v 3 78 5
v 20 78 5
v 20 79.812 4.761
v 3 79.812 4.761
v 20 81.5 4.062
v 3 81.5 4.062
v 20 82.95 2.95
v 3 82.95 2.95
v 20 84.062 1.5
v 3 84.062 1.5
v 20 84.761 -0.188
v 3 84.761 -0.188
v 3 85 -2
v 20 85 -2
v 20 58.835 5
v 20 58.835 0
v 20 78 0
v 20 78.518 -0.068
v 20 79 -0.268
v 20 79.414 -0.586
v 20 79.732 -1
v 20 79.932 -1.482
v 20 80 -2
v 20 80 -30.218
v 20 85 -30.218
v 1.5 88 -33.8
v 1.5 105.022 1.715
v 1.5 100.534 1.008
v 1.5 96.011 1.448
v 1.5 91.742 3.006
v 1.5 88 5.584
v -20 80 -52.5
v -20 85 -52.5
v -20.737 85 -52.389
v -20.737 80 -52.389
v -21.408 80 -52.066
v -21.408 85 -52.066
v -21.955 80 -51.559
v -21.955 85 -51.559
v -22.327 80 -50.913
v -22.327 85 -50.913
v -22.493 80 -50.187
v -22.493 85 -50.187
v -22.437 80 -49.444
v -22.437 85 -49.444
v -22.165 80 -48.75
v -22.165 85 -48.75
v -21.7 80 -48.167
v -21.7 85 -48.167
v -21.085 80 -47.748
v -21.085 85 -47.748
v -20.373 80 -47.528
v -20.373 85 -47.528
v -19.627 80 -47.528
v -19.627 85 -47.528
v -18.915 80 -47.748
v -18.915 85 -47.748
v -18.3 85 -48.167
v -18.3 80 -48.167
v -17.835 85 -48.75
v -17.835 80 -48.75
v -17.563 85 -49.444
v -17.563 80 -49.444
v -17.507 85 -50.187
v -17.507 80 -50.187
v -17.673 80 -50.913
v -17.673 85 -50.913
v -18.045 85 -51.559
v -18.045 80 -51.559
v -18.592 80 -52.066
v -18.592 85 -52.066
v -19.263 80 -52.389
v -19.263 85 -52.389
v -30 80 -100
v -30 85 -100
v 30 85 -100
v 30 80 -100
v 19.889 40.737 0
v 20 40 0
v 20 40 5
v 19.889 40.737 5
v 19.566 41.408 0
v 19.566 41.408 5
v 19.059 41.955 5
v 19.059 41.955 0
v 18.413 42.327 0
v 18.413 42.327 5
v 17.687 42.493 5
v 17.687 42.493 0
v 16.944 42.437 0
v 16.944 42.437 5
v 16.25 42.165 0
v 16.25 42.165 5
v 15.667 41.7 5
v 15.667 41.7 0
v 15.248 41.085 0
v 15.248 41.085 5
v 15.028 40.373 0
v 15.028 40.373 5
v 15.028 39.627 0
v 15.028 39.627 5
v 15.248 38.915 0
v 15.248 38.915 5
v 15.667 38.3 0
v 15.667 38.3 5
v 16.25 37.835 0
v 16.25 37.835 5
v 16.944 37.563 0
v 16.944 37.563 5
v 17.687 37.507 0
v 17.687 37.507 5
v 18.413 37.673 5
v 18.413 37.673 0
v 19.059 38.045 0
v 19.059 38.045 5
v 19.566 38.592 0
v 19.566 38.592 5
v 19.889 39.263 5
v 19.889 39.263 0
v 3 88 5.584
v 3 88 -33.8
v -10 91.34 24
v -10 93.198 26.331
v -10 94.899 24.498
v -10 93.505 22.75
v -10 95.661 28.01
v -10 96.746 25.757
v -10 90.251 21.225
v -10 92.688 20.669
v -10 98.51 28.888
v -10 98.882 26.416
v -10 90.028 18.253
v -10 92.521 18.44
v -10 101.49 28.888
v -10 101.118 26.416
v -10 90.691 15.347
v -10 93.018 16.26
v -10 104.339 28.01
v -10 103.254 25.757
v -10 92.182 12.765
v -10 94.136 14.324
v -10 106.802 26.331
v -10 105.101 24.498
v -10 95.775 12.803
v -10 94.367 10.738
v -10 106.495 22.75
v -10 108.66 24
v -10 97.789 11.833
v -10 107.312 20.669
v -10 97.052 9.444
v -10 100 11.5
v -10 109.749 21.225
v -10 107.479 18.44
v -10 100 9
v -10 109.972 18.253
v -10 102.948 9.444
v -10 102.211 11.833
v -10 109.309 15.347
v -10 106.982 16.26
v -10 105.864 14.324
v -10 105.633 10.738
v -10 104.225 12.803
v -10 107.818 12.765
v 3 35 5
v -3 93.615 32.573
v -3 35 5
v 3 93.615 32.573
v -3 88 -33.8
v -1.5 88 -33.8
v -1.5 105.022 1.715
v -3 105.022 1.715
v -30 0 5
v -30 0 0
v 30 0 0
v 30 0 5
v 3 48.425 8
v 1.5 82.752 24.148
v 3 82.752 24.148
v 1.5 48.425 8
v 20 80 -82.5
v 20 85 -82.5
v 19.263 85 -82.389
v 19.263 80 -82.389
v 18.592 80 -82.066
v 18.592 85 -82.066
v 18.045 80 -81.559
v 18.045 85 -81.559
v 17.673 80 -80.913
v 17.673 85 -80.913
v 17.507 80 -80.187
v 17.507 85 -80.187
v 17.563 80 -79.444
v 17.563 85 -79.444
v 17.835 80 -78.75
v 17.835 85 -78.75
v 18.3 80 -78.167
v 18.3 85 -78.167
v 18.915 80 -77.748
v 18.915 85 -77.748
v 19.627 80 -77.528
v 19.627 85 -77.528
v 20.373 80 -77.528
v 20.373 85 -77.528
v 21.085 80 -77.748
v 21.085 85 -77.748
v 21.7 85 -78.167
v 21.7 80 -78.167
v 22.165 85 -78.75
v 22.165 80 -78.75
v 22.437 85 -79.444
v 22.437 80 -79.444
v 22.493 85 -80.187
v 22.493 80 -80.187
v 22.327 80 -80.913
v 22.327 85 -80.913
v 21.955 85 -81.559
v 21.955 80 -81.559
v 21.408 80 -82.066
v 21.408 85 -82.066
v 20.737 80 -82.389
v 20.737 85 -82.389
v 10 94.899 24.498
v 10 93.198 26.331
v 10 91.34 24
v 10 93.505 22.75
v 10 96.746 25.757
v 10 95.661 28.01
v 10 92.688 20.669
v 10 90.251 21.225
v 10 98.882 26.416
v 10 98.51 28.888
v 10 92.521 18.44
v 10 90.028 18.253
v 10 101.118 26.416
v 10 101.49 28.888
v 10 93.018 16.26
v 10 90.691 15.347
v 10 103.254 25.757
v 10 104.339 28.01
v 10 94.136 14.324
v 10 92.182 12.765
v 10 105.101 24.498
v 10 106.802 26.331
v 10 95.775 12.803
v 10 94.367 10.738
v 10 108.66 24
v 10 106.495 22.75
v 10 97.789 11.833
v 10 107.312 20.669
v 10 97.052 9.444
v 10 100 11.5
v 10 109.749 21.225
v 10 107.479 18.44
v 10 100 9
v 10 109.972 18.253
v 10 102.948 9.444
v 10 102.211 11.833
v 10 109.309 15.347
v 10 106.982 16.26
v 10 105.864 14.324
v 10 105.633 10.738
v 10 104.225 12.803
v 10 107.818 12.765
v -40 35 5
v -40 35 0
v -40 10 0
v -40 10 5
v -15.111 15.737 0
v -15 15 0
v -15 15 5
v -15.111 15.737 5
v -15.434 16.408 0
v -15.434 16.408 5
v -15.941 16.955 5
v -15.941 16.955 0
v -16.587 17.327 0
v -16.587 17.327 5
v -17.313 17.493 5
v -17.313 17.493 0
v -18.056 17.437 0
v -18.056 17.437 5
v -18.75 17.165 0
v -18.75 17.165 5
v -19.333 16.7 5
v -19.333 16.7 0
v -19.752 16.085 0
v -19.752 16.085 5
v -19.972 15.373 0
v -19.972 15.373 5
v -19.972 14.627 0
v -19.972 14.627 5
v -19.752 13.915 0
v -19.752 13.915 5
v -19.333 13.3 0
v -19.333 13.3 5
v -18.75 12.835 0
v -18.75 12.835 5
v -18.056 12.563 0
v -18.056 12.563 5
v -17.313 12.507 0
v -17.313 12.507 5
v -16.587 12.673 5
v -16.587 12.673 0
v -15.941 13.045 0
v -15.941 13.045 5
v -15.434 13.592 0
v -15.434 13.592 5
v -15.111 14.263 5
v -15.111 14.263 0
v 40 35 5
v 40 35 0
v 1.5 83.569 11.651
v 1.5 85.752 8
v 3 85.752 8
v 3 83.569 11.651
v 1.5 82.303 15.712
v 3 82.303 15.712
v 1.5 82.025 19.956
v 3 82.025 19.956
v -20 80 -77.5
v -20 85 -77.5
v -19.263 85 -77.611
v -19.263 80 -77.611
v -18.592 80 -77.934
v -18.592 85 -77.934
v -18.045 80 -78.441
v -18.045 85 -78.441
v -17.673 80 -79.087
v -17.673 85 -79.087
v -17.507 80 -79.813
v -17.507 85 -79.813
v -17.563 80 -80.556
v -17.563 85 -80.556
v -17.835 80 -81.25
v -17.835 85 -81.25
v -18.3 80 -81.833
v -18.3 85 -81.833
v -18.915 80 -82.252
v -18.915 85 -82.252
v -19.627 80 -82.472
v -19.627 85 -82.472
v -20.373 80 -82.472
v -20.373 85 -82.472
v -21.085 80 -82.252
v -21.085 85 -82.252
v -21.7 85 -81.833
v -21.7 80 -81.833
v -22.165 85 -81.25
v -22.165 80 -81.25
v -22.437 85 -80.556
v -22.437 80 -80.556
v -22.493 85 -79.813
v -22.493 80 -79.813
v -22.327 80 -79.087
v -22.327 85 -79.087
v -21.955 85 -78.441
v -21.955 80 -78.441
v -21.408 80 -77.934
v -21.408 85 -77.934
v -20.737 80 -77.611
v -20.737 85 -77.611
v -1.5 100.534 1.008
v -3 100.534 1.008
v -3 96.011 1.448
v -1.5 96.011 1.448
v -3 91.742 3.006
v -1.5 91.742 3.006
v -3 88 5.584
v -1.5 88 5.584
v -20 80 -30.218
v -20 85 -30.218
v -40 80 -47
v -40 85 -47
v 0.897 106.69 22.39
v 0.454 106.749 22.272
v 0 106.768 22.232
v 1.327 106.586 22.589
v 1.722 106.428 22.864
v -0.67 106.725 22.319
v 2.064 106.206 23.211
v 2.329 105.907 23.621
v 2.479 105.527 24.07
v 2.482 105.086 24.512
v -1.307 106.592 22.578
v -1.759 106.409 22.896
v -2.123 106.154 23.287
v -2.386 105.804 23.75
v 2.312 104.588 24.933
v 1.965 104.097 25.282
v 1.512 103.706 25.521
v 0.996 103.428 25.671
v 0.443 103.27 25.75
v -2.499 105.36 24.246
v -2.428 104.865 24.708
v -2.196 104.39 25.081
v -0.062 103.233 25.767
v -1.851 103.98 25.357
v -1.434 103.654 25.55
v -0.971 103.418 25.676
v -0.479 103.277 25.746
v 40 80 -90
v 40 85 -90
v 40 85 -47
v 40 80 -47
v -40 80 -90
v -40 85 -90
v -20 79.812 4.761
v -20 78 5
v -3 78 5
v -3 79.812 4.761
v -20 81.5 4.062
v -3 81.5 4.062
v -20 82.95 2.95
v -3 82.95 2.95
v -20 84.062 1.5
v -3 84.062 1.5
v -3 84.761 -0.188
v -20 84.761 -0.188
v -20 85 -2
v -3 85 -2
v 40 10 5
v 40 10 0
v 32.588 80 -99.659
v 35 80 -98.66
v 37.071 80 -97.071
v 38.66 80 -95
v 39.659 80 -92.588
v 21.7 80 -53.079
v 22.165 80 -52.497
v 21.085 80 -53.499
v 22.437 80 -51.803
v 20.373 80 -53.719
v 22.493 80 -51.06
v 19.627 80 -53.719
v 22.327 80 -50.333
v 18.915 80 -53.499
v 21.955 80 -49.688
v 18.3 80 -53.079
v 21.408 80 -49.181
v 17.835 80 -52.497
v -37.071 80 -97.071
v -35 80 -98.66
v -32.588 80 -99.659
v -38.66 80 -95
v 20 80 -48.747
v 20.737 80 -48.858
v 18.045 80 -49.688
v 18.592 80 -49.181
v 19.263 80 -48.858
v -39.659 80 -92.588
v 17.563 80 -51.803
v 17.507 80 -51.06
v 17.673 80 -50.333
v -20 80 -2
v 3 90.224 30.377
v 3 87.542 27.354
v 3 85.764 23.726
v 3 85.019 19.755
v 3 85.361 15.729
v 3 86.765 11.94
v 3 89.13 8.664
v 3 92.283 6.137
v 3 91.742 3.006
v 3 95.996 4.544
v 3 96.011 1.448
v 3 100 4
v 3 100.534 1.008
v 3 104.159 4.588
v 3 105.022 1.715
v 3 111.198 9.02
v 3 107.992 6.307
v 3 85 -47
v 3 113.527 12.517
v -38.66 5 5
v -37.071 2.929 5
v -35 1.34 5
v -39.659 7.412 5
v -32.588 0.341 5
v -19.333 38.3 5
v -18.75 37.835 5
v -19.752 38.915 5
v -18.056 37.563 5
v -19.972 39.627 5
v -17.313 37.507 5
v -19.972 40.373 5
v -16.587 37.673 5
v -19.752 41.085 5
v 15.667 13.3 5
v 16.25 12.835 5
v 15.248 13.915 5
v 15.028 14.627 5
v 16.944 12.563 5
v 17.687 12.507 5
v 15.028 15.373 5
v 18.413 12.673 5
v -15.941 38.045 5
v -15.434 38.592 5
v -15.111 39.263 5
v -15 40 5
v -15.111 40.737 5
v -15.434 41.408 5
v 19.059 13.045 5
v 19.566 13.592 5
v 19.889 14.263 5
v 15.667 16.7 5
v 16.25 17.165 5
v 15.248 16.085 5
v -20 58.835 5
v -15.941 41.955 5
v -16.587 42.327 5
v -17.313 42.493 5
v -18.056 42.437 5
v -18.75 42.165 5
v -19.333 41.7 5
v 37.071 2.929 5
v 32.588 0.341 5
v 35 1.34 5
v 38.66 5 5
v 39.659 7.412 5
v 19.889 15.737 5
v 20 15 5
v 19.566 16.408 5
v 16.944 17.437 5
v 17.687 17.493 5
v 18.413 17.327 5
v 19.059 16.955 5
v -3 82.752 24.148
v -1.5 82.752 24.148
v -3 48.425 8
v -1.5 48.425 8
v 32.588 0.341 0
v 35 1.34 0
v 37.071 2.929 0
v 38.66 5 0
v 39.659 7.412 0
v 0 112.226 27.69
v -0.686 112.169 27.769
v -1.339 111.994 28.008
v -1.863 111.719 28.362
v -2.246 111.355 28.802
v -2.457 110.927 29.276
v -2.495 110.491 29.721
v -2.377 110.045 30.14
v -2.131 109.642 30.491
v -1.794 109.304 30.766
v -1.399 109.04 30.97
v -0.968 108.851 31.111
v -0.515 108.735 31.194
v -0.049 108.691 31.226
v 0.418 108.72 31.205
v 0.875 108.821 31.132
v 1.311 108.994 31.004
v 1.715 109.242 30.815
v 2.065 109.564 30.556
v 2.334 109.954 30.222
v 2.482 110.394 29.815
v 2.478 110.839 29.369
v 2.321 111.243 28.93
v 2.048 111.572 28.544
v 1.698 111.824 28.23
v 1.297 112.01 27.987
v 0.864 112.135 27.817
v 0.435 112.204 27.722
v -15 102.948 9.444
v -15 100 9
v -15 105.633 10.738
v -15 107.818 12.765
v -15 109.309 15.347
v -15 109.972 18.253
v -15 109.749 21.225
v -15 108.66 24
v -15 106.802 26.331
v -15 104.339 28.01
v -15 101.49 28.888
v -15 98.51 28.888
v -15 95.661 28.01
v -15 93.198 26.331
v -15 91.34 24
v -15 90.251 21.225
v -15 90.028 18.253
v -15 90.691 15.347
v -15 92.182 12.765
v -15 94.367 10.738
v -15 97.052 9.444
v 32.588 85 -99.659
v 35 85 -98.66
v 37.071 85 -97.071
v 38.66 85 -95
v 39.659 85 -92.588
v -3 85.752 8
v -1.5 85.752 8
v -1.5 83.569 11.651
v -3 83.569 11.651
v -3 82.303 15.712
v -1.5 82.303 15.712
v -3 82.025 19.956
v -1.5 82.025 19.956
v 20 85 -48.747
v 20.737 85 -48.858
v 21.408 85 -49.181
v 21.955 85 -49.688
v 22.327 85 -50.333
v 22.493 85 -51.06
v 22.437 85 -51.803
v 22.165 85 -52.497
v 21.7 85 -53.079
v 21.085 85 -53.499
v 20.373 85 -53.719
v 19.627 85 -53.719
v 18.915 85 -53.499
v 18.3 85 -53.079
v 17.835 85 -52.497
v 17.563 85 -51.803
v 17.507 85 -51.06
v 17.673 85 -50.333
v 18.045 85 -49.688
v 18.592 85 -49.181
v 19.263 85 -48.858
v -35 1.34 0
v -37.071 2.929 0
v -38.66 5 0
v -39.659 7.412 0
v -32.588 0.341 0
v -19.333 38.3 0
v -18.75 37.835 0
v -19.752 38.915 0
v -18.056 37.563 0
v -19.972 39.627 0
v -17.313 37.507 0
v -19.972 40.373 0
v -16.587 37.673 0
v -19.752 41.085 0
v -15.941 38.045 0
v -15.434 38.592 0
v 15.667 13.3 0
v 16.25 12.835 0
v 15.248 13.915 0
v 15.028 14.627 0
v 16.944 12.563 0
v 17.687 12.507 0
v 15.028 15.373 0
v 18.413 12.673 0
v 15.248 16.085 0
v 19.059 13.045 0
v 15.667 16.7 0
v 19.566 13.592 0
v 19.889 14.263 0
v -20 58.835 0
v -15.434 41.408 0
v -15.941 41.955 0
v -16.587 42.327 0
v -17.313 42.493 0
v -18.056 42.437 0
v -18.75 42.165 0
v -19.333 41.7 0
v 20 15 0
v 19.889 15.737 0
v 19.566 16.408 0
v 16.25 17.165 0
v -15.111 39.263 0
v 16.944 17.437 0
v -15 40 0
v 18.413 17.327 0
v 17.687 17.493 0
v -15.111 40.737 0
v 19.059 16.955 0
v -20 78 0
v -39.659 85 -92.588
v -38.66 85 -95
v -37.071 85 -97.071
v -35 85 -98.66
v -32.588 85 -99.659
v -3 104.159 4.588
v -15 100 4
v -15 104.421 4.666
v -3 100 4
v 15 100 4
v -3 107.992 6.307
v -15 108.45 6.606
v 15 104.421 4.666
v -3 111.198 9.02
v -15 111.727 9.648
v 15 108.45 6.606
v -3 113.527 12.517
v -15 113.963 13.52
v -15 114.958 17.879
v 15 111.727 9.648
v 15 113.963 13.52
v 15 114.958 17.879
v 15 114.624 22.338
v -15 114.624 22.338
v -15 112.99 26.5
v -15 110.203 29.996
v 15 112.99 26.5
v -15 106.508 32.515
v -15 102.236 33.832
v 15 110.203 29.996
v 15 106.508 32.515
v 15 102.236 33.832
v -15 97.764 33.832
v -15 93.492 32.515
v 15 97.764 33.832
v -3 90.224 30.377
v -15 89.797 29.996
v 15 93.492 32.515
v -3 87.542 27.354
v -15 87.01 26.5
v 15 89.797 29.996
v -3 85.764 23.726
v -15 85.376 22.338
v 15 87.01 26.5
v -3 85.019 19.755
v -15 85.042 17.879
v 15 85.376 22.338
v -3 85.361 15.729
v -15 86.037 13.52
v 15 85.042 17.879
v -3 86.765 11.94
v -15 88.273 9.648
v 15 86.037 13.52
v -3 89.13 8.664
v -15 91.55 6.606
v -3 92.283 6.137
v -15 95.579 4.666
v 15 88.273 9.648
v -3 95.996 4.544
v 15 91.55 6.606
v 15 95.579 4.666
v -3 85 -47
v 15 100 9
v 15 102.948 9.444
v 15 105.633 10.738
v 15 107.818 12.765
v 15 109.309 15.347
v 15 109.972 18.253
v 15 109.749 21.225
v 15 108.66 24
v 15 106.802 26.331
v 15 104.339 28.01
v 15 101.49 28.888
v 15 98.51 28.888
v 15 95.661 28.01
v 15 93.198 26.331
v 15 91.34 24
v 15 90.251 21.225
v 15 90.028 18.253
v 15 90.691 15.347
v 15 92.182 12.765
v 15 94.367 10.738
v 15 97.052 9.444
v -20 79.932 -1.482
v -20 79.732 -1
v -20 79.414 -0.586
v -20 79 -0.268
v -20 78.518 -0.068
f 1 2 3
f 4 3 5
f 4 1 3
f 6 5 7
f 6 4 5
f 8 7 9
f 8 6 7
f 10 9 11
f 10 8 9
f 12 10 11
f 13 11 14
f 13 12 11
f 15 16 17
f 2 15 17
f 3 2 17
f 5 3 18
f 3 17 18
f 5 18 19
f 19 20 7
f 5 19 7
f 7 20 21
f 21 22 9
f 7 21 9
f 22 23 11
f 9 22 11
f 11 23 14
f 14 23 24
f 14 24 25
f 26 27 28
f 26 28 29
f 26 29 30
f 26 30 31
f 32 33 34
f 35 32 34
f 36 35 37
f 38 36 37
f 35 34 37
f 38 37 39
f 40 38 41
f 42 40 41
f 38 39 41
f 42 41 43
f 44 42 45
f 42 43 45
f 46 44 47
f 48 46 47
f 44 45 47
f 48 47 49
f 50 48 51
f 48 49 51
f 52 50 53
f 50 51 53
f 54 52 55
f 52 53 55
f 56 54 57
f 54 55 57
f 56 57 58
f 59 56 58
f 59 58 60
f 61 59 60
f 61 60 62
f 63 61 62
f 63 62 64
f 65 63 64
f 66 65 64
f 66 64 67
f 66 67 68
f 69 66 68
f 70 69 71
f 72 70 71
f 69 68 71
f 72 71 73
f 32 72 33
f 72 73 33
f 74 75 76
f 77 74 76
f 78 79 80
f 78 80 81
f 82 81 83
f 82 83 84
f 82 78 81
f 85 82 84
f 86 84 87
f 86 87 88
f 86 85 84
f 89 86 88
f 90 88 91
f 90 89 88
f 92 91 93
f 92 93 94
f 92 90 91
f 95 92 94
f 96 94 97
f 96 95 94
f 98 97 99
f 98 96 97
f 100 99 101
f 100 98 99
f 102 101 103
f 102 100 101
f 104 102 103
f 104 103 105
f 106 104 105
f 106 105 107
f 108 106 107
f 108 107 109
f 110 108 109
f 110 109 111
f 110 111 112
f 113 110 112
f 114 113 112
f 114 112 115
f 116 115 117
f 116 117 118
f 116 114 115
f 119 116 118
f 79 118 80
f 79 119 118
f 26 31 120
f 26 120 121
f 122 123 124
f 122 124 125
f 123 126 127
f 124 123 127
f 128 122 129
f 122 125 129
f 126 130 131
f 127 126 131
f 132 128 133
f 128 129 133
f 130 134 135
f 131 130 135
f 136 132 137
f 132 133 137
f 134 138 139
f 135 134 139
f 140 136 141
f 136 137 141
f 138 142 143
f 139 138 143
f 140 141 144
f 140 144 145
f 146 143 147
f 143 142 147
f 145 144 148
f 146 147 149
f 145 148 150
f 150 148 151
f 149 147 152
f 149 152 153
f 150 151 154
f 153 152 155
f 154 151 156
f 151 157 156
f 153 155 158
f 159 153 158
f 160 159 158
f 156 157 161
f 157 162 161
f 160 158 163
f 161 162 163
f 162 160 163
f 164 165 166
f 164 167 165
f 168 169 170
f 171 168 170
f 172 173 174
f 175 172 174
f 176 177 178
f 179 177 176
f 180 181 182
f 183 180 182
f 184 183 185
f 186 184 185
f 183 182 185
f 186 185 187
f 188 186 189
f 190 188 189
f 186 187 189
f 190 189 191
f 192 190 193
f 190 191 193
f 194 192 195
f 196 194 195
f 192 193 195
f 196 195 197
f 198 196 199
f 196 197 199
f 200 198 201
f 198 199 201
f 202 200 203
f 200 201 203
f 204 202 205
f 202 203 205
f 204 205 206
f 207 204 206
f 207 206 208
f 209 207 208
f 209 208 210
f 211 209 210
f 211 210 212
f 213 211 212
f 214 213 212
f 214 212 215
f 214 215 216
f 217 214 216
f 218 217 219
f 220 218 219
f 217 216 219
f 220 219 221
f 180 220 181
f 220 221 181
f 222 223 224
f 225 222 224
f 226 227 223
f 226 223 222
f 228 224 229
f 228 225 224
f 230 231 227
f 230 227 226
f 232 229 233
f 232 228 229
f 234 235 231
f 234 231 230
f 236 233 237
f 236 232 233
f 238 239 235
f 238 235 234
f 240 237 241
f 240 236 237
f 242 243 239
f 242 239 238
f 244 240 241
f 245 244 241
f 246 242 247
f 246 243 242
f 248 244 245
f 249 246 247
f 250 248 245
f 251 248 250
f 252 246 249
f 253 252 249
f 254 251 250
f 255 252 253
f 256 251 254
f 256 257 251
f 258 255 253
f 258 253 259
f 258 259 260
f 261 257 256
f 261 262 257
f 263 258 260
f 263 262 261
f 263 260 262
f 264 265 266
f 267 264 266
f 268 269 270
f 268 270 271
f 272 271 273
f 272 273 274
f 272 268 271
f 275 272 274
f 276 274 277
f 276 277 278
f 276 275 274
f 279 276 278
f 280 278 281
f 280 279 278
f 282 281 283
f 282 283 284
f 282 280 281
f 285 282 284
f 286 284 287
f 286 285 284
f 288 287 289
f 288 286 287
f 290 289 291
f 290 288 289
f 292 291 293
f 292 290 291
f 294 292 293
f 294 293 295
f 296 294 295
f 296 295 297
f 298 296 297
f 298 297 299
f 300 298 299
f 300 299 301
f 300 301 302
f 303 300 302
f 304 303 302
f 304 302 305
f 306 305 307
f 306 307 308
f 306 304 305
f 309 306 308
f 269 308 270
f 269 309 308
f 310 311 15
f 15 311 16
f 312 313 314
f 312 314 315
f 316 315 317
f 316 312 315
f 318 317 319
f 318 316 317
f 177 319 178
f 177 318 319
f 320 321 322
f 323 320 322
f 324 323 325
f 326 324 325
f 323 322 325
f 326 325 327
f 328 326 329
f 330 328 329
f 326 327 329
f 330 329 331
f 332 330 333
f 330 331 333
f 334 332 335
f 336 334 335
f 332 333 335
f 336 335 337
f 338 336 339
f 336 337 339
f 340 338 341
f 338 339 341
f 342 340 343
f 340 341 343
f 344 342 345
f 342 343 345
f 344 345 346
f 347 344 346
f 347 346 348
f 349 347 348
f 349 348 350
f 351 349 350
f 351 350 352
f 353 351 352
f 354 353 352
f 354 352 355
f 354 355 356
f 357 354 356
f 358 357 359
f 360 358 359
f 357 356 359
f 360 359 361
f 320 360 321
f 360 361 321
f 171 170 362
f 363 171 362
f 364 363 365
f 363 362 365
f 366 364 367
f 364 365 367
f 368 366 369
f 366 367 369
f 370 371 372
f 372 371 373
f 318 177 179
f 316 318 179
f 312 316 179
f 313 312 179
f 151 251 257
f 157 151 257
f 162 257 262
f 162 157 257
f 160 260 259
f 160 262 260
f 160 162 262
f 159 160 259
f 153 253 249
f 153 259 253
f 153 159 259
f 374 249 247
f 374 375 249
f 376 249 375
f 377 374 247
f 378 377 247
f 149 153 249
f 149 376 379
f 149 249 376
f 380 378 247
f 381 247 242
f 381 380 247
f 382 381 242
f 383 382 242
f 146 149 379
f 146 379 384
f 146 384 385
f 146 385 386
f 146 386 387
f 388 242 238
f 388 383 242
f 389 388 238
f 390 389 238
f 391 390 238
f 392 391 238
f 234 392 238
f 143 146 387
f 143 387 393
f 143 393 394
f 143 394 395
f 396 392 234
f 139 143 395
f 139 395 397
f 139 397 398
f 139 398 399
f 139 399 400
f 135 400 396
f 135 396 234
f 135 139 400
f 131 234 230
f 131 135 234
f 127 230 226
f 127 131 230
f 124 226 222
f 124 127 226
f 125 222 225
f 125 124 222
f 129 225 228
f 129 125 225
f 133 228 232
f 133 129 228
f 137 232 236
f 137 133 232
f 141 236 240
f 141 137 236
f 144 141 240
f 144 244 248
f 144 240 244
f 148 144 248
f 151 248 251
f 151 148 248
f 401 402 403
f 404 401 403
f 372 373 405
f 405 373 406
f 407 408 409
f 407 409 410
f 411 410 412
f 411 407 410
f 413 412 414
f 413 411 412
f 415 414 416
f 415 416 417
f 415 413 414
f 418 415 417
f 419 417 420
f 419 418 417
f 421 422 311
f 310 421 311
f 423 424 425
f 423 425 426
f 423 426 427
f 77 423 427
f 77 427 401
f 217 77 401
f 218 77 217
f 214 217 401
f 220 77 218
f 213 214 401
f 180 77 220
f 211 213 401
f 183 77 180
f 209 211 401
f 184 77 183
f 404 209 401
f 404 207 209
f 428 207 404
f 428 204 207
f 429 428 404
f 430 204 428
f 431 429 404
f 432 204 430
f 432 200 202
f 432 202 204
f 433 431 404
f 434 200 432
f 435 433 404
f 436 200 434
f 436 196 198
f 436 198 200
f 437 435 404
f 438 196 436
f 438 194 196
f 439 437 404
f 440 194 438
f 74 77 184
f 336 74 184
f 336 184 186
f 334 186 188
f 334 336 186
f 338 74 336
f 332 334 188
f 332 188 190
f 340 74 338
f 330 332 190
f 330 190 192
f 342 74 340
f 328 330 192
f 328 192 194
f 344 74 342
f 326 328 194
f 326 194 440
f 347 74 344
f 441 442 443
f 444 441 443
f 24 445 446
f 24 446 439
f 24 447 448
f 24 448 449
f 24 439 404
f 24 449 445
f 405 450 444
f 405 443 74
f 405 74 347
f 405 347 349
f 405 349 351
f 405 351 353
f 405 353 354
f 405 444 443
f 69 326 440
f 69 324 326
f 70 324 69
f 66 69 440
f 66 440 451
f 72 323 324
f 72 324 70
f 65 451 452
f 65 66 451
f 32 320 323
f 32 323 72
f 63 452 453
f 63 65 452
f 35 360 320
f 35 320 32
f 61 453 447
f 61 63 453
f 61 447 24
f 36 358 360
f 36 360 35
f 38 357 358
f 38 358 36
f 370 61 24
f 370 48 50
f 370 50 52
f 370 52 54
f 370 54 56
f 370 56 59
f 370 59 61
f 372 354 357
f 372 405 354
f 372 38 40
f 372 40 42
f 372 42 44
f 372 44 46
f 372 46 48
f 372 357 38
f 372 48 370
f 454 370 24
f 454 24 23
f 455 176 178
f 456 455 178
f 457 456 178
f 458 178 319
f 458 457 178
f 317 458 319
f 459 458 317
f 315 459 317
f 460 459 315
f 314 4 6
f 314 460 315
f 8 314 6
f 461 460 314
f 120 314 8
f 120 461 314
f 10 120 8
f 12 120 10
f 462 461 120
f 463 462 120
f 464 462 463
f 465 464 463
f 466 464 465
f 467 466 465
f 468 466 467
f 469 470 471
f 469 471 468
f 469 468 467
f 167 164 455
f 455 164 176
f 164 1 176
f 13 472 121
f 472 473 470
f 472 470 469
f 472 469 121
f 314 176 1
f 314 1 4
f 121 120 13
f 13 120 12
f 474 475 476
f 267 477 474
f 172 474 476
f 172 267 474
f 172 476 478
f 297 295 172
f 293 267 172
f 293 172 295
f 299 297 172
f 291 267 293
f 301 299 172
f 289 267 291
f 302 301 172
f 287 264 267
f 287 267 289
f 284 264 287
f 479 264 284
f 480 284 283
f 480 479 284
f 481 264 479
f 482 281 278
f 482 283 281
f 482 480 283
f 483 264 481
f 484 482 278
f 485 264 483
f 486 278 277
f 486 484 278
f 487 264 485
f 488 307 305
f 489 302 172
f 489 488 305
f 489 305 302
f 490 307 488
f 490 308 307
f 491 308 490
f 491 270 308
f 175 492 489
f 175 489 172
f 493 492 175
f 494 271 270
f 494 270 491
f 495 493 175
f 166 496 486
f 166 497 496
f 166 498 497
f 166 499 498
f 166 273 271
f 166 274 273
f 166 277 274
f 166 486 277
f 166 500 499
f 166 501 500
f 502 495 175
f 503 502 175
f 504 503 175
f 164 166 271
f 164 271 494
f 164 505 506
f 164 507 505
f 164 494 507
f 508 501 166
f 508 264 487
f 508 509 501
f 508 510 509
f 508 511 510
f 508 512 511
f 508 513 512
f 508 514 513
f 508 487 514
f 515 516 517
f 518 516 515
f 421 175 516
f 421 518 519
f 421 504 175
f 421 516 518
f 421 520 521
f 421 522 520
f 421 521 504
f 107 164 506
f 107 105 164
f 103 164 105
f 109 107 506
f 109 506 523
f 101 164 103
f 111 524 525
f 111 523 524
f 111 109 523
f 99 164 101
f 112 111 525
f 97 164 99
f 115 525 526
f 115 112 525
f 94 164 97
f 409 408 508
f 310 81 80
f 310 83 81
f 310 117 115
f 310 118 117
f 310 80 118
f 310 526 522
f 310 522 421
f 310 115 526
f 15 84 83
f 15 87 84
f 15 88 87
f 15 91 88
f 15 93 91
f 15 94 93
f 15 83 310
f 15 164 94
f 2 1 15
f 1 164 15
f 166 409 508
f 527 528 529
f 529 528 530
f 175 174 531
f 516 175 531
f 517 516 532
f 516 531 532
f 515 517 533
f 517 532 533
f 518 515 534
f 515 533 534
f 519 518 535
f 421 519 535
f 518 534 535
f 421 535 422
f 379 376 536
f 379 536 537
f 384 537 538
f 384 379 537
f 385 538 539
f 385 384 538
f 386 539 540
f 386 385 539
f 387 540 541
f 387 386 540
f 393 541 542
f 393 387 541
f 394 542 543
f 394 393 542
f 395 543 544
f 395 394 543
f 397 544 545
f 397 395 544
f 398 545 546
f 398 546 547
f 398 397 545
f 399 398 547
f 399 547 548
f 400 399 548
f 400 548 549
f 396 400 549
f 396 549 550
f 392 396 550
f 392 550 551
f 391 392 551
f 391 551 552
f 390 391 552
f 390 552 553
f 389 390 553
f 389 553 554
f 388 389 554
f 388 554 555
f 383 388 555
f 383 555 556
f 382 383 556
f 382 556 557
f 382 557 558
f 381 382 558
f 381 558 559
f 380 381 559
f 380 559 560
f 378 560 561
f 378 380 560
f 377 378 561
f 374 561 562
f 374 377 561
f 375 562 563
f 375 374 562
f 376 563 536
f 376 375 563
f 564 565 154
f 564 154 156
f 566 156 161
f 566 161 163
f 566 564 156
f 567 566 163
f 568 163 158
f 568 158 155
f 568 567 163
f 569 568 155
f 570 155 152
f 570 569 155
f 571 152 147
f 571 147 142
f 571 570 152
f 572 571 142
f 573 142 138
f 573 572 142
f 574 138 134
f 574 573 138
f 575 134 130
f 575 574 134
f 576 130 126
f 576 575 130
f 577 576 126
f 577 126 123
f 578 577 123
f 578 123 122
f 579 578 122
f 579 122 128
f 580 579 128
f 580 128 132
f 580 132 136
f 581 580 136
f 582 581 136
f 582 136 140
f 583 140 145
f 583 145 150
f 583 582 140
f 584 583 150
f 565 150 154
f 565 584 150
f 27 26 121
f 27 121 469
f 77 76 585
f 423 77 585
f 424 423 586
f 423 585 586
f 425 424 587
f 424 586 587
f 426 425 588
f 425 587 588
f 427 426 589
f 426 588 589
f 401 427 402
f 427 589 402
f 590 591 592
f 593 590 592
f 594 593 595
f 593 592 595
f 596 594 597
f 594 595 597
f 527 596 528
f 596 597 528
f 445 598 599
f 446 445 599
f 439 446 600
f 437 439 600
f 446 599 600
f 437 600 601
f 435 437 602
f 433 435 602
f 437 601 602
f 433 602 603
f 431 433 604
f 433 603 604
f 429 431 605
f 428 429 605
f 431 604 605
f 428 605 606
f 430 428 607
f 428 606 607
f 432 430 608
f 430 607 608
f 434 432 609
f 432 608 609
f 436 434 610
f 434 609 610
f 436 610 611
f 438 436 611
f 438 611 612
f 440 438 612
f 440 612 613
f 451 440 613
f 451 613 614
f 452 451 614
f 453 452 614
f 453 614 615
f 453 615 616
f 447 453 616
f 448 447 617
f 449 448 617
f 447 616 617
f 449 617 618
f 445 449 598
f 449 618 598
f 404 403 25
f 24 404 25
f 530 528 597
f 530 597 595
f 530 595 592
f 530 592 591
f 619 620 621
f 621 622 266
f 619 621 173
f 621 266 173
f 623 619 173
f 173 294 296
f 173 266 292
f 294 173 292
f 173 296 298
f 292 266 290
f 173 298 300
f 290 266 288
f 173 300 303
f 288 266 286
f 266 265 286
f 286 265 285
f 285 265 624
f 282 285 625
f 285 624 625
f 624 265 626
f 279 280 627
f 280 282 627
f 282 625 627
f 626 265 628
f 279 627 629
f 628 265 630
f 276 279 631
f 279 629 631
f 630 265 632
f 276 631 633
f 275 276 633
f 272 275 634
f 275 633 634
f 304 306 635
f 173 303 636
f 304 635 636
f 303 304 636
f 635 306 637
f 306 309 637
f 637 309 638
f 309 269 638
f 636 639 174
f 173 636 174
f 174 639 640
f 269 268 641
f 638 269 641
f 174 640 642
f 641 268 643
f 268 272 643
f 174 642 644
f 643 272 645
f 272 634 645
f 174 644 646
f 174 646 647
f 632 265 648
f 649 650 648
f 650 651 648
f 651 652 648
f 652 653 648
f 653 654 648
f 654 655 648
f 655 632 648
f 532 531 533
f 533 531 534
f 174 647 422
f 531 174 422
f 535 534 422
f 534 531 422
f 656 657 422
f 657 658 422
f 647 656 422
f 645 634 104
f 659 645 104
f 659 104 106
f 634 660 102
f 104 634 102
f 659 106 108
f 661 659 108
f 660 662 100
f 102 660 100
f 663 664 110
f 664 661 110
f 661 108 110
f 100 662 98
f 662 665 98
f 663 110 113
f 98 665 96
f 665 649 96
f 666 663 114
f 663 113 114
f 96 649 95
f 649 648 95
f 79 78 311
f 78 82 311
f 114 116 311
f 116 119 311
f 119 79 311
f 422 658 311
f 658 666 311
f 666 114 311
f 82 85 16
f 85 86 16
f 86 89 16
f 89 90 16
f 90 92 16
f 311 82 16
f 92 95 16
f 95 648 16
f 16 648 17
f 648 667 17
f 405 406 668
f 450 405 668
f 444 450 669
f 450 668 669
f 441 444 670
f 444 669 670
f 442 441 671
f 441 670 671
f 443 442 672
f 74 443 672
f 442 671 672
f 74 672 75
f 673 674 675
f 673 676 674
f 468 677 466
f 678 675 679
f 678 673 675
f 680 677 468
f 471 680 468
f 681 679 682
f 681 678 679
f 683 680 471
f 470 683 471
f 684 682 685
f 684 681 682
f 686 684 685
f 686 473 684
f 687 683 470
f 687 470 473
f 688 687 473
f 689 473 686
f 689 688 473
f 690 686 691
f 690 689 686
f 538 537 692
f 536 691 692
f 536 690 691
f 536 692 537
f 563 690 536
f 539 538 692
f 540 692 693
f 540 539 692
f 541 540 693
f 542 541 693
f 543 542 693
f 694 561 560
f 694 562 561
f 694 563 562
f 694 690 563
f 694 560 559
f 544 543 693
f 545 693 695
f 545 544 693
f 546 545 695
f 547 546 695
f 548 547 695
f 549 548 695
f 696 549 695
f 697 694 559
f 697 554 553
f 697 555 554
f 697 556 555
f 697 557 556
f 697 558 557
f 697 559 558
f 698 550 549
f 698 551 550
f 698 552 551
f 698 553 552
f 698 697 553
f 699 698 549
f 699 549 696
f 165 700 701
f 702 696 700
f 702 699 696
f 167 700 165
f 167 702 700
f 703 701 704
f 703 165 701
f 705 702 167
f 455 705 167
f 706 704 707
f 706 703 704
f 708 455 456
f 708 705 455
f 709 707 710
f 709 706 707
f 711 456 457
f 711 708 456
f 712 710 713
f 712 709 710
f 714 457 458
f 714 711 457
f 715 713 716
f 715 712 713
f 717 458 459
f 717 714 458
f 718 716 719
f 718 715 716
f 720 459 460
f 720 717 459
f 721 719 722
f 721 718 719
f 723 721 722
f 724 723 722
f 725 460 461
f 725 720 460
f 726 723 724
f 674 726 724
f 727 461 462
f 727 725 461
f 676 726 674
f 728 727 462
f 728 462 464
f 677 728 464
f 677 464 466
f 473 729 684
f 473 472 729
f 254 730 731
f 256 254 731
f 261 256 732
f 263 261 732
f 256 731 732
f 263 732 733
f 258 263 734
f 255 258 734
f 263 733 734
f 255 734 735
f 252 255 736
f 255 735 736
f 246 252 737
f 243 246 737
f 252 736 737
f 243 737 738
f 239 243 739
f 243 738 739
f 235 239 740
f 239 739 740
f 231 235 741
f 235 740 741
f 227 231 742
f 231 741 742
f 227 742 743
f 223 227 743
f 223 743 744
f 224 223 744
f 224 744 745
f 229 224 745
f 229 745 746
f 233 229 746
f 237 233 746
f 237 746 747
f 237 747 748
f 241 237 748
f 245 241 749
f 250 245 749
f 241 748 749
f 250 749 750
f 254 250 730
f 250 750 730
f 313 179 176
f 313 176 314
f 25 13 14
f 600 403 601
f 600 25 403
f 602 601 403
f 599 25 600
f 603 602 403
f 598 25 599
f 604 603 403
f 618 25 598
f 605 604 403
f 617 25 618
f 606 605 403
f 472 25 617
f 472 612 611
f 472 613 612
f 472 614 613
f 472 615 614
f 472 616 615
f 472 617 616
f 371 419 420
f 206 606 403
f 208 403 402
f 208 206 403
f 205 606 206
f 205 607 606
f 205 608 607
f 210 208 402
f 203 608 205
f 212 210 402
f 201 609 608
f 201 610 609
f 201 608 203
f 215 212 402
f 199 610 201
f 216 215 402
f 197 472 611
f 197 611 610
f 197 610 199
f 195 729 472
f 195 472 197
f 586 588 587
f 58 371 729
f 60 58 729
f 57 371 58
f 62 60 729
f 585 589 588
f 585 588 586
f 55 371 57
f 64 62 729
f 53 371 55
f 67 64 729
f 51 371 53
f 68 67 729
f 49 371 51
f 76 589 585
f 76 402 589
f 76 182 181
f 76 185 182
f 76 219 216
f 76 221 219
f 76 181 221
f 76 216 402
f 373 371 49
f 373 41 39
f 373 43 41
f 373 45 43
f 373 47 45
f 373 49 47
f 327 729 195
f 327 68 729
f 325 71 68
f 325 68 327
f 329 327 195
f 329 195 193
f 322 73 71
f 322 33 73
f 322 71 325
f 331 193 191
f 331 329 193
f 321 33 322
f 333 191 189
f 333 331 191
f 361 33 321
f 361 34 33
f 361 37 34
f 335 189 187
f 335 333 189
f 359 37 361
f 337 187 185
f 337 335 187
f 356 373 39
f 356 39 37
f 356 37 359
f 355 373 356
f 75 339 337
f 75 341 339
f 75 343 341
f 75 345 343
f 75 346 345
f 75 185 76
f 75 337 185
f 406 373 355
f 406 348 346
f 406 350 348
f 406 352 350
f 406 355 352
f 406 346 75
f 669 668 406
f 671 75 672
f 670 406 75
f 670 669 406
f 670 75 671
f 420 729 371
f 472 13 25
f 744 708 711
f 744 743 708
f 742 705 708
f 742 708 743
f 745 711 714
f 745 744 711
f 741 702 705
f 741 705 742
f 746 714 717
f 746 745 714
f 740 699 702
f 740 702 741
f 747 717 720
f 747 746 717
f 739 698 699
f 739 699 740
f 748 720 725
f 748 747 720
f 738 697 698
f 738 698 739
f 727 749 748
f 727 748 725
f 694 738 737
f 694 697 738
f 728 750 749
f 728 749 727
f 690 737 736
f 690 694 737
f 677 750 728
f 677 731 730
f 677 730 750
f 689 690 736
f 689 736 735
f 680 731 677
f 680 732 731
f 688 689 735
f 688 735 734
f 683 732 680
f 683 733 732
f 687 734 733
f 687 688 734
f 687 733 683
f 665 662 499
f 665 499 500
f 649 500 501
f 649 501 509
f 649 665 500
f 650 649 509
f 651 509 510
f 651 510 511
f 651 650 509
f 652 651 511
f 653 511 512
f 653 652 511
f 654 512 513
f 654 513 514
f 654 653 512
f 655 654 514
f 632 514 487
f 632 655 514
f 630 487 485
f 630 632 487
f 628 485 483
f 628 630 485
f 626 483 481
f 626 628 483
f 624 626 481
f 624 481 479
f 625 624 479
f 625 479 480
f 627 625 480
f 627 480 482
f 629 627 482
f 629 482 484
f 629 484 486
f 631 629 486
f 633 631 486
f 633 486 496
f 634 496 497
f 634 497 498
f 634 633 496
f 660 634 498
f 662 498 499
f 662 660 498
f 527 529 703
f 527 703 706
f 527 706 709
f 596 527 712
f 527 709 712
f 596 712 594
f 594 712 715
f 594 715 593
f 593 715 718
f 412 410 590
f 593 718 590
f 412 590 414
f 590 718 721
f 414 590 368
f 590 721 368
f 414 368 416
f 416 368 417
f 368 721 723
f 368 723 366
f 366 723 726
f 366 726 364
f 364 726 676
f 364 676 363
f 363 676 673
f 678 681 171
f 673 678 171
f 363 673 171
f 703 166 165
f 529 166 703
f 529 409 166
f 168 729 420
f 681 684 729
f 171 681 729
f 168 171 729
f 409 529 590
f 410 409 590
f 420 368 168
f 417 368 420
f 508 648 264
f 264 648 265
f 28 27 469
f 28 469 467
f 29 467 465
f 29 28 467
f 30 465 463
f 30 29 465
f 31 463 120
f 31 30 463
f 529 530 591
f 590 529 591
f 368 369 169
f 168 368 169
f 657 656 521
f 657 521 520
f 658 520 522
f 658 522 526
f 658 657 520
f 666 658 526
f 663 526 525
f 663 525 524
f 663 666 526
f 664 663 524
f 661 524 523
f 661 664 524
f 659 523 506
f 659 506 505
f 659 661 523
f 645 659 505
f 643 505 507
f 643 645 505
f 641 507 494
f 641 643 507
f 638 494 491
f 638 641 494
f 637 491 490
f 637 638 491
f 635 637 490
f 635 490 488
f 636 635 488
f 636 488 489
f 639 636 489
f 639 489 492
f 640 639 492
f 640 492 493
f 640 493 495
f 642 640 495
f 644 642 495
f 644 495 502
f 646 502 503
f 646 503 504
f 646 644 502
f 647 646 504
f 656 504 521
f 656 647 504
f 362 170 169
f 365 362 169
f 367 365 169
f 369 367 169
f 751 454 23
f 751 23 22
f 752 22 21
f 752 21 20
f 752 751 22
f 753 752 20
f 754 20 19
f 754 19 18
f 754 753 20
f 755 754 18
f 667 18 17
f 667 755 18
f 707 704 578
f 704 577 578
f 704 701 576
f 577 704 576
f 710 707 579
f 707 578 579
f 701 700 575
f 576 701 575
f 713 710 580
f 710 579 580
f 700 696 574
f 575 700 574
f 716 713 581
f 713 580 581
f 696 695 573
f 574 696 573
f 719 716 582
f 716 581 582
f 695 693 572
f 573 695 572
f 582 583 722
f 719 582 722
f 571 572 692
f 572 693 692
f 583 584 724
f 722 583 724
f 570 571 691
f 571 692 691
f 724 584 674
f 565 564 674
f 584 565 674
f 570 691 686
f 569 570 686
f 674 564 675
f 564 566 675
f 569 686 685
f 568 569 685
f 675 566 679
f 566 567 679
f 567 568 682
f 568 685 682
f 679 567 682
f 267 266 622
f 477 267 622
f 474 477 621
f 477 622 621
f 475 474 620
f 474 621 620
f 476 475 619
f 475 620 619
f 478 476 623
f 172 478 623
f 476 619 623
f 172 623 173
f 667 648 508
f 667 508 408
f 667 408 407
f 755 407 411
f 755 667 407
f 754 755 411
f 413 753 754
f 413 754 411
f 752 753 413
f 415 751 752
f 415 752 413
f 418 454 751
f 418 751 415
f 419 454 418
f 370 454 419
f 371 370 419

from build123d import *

# Parameters (mm, degrees)
SKETCH1_R                    = 2.5
BASE_FLANGE1_DEPTH           = 5
SKETCH6_R                    = 2.5
BASE_FLANGE2_DEPTH           = 5
EDGE_FLANGE1_STRIP_W         = 24
EDGE_FLANGE1_STRIP_H         = 5
EDGE_FLANGE1_STRIP_CUT_DEPTH = 40
EDGE_FLANGE1_DEPTH           = 40
SKETCH19_R                   = 15
SKETCH19_R_2                 = 7.5
BOSS_EXTRUDE1_DEPTH          = 15
SKETCH20_R                   = 10
CUT_EXTRUDE1_DEPTH           = 5
BOSS_EXTRUDE2_DEPTH          = 3
CUT_EXTRUDE3_START           = 1.5
CUT_EXTRUDE3_DEPTH           = 1.5
CUT_EXTRUDE4_START           = 20
SKETCH23_R                   = 2.5
CUT_EXTRUDE4_DEPTH           = 126.187158898


# Sheet-metal steps are written as plain solids
with BuildPart() as part:
    # Sketch1 → Base-Flange1 (new body)
    with BuildSketch(Plane.XY):
        with BuildLine():
            Line((-30, 0), (30, 0))
            ThreePointArc((30, 0), (37.071067812, 2.928932188), (40, 10))
            Line((40, 10), (40, 35))
            Line((40, 35), (20, 58.835071852))
            Line((20, 58.835071852), (20, 85))
            Line((20, 85), (-20, 85))
            Line((-20, 85), (-20, 58.835071852))
            Line((-20, 58.835071852), (-40, 35))
            Line((-40, 35), (-40, 10))
            ThreePointArc((-40, 10), (-37.071067812, 2.928932188), (-30, 0))
        make_face()
        with Locations((17.5, 15)):
            Circle(SKETCH1_R, mode=Mode.SUBTRACT)
        with Locations((-17.5, 15)):
            Circle(SKETCH1_R, mode=Mode.SUBTRACT)
        with Locations((-17.5, 40)):
            Circle(SKETCH1_R, mode=Mode.SUBTRACT)
        with Locations((17.5, 40)):
            Circle(SKETCH1_R, mode=Mode.SUBTRACT)
    extrude(amount=BASE_FLANGE1_DEPTH)

    # Edge-Flange1 strip (across the edge) → Edge-Flange1 strip cut (cut)
    with BuildSketch(Plane(origin=(-20, 85, 0), x_dir=(0, -1, 0), z_dir=(1, 0, 0))):
        with Locations((-5, -2.5)):
            Rectangle(EDGE_FLANGE1_STRIP_W, EDGE_FLANGE1_STRIP_H)
    extrude(amount=EDGE_FLANGE1_STRIP_CUT_DEPTH, mode=Mode.SUBTRACT)

    # Edge-Flange1 section (across the edge) → Edge-Flange1 (add)
    with BuildSketch(Plane(origin=(-20, 85, 0), x_dir=(0, -1, 0), z_dir=(1, 0, 0))):
        with BuildLine():
            Line((0, 2), (0, 30.218007376))
            Line((0, 30.218007376), (5, 30.218007376))
            Line((5, 30.218007376), (5, 2))
            ThreePointArc((5, 2), (5.585786438, 0.585786438), (7, 0))
            Line((7, 0), (7, -5))
            ThreePointArc((7, -5), (2.050252532, -2.949747468), (0, 2))
        make_face()
    extrude(amount=EDGE_FLANGE1_DEPTH)


with BuildPart() as body_2:
    # Sketch6 → Base-Flange2 (new body)
    with BuildSketch(Plane(origin=(0, 85, 0), x_dir=(1, 0, 0), z_dir=(0, 1, 0))):
        with BuildLine():
            Line((-30, 100), (30, 100))
            ThreePointArc((30, 100), (37.071067812, 97.071067812), (40, 90))
            Line((40, 90), (40, 47))
            Line((40, 47), (20, 30.218007376))
            Line((20, 30.218007376), (-20, 30.218007376))
            Line((-20, 30.218007376), (-40, 47))
            Line((-40, 47), (-40, 90))
            ThreePointArc((-40, 90), (-37.071067812, 97.071067812), (-30, 100))
        make_face()
        with Locations(Location((-20, 80, 0), (0, 0, 270))):
            Circle(SKETCH6_R, mode=Mode.SUBTRACT)
        with Locations(Location((20, 80, 0), (0, 0, 90))):
            Circle(SKETCH6_R, mode=Mode.SUBTRACT)
        with Locations(Location((20, 51.246765298, 0), (0, 0, 270))):
            Circle(SKETCH6_R, mode=Mode.SUBTRACT)
        with Locations(Location((-20, 50, 0), (0, 0, 90))):
            Circle(SKETCH6_R, mode=Mode.SUBTRACT)
    extrude(amount=-BASE_FLANGE2_DEPTH)

    # Combine2: union part
    add(part.part)



with BuildPart() as body_2_2:
    # Sketch19 → Boss-Extrude1 (new, symmetric)
    with BuildSketch(Plane(origin=(0, 0, 0), x_dir=(0, 0, -1), z_dir=(1, 0, 0))):
        with Locations((-19, 100)):
            Circle(SKETCH19_R)
        with Locations((-19, 100)):
            Circle(SKETCH19_R_2, mode=Mode.SUBTRACT)
    extrude(amount=BOSS_EXTRUDE1_DEPTH, both=True)

    # Sketch20 → Cut-Extrude1 (cut)
    with BuildSketch(Plane(origin=(15, 0, 0), x_dir=(0, 0, -1), z_dir=(1, 0, 0))):
        with Locations((-19, 100)):
            Circle(SKETCH20_R)
    cut_extrude1 = extrude(amount=-CUT_EXTRUDE1_DEPTH, mode=Mode.SUBTRACT)

    # Mirror1: Cut-Extrude1 across plane
    add(cut_extrude1.mirror(Plane(origin=(0, 0, 0), x_dir=(0, 0, 1), z_dir=(1, 0, 0))), mode=Mode.SUBTRACT)


with BuildPart() as body_2_1:
    add(body_2.part)

    add(body_2_2.part)  # Boss-Extrude2 merges body 2 2
    # Sketch21 → Boss-Extrude2 (add, symmetric)
    with BuildSketch(Plane(origin=(0, 0, 0), x_dir=(0, 0, -1), z_dir=(1, 0, 0))):
        with BuildLine():
            Line((-32.573201875, 93.615002673), (-5, 35))
            Line((-5, 35), (-5, 78))
            ThreePointArc((-5, 78), (-2.949747468, 82.949747468), (2, 85))
            Line((2, 85), (47, 85))
            Line((47, 85), (-12.516699411, 113.526522593))
            ThreePointArc((-12.516699411, 113.526522593), (-8.431942873, 89.354993257), (-32.573201875, 93.615002673))
        make_face()
    extrude(amount=BOSS_EXTRUDE2_DEPTH, both=True)

    # Sketch22 → Cut-Extrude3 (cut)
    with BuildSketch(Plane(origin=(0, 0, 0), x_dir=(0, 0, -1), z_dir=(1, 0, 0)).offset(CUT_EXTRUDE3_START)):
        with BuildLine():
            Line((-24.147646276, 82.751761313), (-8, 48.425159203))
            Line((-8, 48.425159203), (-8, 85.752193151))
            ThreePointArc((-8, 85.752193151), (-15.711663212, 82.302914331), (-24.147646276, 82.751761313))
        make_face()
        with BuildLine():
            Line((33.8, 88), (-1.714869921, 105.02237774))
            ThreePointArc((-1.714869921, 105.02237774), (-1.447608596, 96.010820135), (-5.583592135, 88))
            Line((-5.583592135, 88), (33.8, 88))
        make_face()
    cut_extrude3 = extrude(amount=CUT_EXTRUDE3_DEPTH, mode=Mode.SUBTRACT)

    # Mirror4: Cut-Extrude3 across plane
    add(cut_extrude3.mirror(Plane(origin=(0, 0, 0), x_dir=(0, 0, 1), z_dir=(1, 0, 0))), mode=Mode.SUBTRACT)

    # Sketch23 → Cut-Extrude4 (cut, through all)
    with BuildSketch(Plane(origin=(20, 82.949747468, 2.949747468), x_dir=(1, 0, 0), z_dir=(0, 0.7071067811865468, 0.7071067811865483)).offset(CUT_EXTRUDE4_START)):
        with Locations(Location((-20, 0.707106781, 0), (0, 0, 90))):
            Circle(SKETCH23_R)
    extrude(amount=CUT_EXTRUDE4_DEPTH, mode=Mode.SUBTRACT)


solid = body_2_1.part
